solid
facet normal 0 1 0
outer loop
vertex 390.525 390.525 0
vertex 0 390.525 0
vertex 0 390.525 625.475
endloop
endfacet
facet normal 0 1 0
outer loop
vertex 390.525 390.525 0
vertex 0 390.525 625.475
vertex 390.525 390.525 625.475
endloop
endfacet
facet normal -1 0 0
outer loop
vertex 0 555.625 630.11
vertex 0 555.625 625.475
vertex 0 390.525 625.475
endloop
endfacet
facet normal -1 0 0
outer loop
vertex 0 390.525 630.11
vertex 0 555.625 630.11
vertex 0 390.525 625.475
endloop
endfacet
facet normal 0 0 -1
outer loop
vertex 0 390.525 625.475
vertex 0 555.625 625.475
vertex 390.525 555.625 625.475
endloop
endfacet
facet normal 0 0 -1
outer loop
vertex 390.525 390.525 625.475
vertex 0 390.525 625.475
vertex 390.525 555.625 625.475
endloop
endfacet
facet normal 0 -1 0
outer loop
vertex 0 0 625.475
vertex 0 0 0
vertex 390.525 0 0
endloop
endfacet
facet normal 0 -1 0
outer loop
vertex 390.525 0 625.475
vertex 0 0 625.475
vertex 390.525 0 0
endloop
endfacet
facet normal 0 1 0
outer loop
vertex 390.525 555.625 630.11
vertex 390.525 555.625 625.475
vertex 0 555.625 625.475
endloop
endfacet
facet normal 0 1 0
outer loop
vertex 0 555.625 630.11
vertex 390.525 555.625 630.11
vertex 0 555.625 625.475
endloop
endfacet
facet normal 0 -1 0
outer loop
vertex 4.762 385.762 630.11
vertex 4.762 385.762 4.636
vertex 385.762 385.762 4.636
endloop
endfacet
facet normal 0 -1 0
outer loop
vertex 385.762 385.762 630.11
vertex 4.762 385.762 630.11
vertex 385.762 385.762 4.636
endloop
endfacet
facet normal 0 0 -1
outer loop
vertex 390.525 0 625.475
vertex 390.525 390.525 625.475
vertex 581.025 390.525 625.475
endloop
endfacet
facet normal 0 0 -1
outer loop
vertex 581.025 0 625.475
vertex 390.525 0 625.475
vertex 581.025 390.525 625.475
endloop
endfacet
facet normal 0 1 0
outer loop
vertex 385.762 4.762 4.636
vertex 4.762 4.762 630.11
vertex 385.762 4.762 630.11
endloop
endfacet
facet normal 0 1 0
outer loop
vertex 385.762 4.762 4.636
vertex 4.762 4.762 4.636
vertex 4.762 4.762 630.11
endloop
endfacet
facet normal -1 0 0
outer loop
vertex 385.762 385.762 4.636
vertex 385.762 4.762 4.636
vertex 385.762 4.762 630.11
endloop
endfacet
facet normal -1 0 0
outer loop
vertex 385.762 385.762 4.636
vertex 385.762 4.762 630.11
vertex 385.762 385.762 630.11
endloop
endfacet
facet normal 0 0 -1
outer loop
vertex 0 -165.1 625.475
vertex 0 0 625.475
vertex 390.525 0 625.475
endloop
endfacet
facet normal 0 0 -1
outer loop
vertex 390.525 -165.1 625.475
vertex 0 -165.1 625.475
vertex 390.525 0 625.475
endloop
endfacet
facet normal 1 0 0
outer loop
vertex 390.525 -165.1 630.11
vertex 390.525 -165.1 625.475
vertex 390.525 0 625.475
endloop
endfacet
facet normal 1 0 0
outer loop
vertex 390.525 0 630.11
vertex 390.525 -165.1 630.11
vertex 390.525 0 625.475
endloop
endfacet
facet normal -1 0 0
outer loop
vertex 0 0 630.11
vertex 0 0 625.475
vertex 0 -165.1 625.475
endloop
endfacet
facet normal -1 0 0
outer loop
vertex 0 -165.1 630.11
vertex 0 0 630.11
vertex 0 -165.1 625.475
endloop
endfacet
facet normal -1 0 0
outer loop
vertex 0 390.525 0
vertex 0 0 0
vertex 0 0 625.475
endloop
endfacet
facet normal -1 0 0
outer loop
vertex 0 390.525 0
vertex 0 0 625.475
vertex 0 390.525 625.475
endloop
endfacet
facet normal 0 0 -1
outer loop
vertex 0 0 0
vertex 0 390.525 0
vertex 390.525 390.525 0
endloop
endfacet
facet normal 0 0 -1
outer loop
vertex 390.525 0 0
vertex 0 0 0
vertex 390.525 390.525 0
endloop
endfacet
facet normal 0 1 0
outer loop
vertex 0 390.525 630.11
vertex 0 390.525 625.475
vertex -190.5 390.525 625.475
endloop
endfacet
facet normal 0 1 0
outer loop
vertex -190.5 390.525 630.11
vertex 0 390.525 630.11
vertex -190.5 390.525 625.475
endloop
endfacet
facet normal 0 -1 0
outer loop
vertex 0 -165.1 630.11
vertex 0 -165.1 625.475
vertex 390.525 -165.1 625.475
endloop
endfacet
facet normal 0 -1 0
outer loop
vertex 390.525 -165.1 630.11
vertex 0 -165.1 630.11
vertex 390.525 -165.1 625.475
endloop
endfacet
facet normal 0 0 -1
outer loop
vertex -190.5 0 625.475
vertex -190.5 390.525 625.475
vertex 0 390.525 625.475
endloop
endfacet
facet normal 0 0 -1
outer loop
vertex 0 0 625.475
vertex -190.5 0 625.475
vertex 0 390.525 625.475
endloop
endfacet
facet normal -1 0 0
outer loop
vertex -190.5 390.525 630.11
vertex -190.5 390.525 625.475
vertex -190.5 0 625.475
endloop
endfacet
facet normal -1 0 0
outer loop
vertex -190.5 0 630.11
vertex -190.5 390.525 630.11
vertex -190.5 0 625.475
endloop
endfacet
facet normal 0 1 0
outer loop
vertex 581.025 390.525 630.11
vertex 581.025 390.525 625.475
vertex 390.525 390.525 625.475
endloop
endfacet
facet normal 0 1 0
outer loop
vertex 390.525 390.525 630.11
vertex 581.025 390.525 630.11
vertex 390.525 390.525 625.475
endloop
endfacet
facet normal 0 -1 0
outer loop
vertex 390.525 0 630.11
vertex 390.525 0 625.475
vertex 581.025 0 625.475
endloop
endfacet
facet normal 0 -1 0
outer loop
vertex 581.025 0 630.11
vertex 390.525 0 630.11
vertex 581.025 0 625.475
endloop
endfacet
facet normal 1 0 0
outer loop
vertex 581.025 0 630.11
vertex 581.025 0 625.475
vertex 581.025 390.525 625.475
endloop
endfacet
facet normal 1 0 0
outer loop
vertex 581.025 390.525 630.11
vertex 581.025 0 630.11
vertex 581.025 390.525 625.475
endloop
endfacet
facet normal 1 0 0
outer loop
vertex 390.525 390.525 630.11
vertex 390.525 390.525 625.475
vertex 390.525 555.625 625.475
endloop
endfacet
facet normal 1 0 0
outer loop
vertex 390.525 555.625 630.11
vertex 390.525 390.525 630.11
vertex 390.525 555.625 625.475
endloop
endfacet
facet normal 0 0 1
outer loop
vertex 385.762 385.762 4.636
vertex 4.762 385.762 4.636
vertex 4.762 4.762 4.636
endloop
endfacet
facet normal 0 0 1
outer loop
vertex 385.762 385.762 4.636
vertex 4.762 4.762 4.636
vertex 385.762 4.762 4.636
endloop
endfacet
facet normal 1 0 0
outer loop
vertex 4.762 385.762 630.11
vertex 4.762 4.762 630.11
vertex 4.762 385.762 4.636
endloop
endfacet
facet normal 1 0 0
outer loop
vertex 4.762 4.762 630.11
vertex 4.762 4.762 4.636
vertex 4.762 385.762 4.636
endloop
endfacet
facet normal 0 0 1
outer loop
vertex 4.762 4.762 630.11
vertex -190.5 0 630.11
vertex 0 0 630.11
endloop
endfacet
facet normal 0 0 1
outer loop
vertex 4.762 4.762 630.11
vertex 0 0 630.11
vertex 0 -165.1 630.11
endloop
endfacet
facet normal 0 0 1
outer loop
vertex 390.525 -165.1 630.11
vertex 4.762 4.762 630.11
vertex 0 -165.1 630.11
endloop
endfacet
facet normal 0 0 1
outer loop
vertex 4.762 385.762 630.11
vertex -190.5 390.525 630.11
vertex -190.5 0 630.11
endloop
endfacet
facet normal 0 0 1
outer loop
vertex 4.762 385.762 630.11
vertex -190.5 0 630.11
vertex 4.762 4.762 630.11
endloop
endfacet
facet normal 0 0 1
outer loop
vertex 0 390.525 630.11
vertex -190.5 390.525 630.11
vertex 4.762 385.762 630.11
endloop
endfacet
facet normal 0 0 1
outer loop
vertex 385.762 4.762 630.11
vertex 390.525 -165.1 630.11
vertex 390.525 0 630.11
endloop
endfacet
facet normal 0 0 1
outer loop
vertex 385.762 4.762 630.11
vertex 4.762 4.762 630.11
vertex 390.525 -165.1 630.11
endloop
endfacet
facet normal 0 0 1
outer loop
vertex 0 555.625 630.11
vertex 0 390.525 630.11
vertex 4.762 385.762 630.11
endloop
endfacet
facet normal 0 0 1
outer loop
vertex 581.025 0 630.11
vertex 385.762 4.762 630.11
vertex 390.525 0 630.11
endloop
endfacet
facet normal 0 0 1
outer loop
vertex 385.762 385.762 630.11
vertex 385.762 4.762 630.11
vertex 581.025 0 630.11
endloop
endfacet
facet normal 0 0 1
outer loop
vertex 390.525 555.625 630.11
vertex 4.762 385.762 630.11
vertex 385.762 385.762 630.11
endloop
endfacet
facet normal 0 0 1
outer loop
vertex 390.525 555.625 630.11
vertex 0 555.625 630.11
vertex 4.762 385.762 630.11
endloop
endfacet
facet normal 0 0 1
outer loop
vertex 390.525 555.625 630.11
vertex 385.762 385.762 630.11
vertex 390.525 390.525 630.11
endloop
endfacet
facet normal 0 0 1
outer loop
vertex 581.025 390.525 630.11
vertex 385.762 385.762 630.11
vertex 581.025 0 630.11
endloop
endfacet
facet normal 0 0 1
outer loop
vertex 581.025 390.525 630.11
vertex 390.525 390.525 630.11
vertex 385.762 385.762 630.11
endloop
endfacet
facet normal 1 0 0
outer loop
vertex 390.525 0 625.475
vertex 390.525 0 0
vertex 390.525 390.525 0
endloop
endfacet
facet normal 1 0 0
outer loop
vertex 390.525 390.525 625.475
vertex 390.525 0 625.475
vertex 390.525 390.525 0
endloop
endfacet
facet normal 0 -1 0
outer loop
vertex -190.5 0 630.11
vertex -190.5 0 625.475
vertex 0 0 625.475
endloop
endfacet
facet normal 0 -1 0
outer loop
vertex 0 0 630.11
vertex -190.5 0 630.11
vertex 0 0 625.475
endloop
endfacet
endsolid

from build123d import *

# Parameters (mm, degrees)
F0_W     = 390.525
F0_H     = 390.525
F0_W_2   = 381
F0_H_2   = 381
F1_DEPTH = 625.475
F2_DEPTH = 4.6355
F4_W     = 381
F4_H     = 381
F5_DEPTH = 4.6355


with BuildPart() as f1:
    # F0 (on Top) → F1 (new body)
    with BuildSketch(Plane.XY):
        with Locations((195.2625, 195.2625)):
            Rectangle(F0_W, F0_H)
        with Locations((195.2625, 195.2625)):
            Rectangle(F0_W_2, F0_H_2, mode=Mode.SUBTRACT)
    extrude(amount=F1_DEPTH)

    # F0 (on Top) → F2 (join)
    with BuildSketch(Plane.XY):
        with Locations((195.2625, 195.2625)):
            Rectangle(F0_W_2, F0_H_2)
    extrude(amount=F2_DEPTH)

    # F4 (on plane+point) → F5 (join)
    with BuildSketch(Plane.XY.offset(625.475)):
        Polygon((-190.5, 0), (0, 0), (0, -165.1), (390.525, -165.1), (390.525, 0), (581.025, 0), (581.025, 390.525), (390.525, 390.525), (390.525, 555.625), (0, 555.625), (0, 390.525), (-190.5, 390.525), align=None)
        with Locations((195.2625, 195.2625)):
            Rectangle(F4_W, F4_H, mode=Mode.SUBTRACT)
    extrude(amount=F5_DEPTH)


solid = f1.part
